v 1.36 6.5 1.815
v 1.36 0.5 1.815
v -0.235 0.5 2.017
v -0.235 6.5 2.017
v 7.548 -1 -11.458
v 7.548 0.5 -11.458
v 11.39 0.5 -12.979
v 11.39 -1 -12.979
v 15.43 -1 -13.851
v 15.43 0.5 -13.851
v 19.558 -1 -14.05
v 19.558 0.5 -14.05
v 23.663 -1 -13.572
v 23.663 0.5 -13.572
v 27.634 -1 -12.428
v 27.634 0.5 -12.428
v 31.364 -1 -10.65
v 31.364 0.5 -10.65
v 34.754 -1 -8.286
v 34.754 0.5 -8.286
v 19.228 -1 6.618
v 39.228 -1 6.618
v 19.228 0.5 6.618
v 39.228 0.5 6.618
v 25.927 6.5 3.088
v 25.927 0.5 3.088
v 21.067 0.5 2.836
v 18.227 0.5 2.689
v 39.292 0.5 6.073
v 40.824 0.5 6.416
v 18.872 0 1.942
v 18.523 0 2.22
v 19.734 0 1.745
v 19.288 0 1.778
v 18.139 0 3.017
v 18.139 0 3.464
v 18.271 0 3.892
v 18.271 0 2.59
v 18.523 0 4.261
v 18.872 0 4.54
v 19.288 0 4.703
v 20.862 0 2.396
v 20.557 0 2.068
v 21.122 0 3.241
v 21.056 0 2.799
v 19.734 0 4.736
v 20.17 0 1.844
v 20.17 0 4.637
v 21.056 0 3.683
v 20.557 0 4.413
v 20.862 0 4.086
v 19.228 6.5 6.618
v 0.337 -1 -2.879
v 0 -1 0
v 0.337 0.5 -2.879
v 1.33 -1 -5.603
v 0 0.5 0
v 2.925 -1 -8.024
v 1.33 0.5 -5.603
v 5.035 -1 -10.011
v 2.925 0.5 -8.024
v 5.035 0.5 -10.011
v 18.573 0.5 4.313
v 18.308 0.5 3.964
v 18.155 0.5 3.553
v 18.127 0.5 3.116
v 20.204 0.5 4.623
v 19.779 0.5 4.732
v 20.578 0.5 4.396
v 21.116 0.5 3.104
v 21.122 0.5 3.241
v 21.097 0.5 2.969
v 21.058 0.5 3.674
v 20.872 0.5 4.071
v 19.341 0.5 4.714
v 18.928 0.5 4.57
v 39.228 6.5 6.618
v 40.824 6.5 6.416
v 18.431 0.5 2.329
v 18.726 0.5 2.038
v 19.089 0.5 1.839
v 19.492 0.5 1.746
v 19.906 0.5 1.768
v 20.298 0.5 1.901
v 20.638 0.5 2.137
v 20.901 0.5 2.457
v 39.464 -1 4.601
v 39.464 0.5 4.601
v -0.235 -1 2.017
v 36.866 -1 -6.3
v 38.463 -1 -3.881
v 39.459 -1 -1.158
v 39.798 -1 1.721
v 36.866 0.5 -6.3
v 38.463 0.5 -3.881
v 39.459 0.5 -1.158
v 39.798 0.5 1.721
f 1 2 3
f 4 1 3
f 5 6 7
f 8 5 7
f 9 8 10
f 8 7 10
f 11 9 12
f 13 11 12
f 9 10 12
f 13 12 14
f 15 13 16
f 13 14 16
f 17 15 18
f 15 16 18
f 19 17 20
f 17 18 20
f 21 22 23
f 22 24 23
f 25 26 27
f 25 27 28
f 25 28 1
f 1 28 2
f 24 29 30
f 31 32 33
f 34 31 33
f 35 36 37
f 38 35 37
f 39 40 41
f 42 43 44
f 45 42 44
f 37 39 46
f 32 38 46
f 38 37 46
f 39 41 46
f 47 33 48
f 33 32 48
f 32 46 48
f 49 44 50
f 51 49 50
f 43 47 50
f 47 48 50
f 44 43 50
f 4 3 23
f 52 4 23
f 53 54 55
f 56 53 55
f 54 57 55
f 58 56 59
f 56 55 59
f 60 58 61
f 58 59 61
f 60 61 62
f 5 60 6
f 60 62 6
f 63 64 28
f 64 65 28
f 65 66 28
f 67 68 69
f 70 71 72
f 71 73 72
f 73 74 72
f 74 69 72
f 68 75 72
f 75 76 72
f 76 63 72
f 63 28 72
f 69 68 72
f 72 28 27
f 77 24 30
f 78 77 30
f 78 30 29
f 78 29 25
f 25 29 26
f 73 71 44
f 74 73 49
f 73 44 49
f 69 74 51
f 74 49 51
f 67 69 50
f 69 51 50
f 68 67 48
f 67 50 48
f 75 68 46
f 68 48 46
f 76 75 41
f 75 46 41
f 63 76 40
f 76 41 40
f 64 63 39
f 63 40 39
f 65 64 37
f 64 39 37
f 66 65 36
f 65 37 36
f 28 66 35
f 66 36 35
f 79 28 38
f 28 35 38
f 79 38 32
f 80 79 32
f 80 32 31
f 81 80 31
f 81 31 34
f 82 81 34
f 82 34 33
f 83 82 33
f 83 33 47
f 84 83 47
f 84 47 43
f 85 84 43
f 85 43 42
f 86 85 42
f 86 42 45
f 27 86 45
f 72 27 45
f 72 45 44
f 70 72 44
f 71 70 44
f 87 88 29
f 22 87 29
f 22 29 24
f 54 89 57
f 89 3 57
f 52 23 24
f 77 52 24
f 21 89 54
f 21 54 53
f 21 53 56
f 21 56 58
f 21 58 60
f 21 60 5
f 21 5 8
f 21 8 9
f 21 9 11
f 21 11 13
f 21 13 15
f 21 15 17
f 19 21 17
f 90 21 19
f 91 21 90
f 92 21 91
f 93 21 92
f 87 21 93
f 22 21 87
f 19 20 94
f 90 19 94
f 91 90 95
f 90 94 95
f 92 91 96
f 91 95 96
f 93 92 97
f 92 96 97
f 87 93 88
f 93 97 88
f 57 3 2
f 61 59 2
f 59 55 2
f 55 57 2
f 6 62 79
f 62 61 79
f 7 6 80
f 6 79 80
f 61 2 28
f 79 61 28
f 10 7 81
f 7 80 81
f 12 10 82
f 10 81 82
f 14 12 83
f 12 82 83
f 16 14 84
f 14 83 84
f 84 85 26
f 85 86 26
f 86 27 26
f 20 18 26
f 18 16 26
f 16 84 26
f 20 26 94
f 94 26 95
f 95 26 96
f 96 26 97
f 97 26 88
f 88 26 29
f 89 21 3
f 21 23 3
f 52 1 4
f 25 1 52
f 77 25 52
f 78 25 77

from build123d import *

# Parameters (mm, degrees)
SALIENTE_EXTRUIR2_DEPTH = 0.5
CORTAR_EXTRUIR1_DEPTH   = 0.5
CROQUIS10_R             = 1.5
SALIENTE_EXTRUIR5_DEPTH = 0.5
SALIENTE_EXTRUIR6_DEPTH = 6
SALIENTE_EXTRUIR8_DEPTH = 1


with BuildPart() as part:
    # Croquis2 → Saliente-Extruir2 (new body)
    with BuildSketch(Plane(origin=(0, 0, 0), x_dir=(1, 0, 0), z_dir=(0, 1, 0))):
        with BuildLine():
            Line((0, 0), (20, 0))
            Line((20, 0), (39.463577456, -4.600994744))
            ThreePointArc((39.463577456, -4.600994744), (39.040324802, 2.548287638), (34.753818463, 8.285642846))
            ThreePointArc((34.753818463, 8.285642846), (21.620038065, 13.895364206), (7.548005539, 11.457524625))
            ThreePointArc((7.548005539, 11.457524625), (2.056591074, 6.860161407), (0, 0))
        make_face()
    extrude(amount=SALIENTE_EXTRUIR2_DEPTH)

    # Croquis3 → Cortar-Extruir1 (cut)
    with BuildSketch(Plane(origin=(0, 0.5, 0), x_dir=(1, 0, 0), z_dir=(0, 1, 0))):
        with BuildLine():
            Line((20, 0), (16.5, 0))
            ThreePointArc((16.5, 0), (20.143291885, 1.229040833), (23.406126055, -0.80517408))
            Line((23.406126055, -0.80517408), (20, 0))
        make_face()
    extrude(amount=-CORTAR_EXTRUIR1_DEPTH, mode=Mode.SUBTRACT)

    # Croquis10 → Saliente-Extruir5 (add)
    with BuildSketch(Plane.XZ):
        Polygon((19.228440578, 6.617808668), (-0.235136993, 2.016814414), (0, 0), (19.62217394, -4.124844283), (39.463577456, 4.600994744), (39.228440578, 6.617808164), align=None)
        with Locations((19.622174052, 3.240683566)):
            Circle(CROQUIS10_R, mode=Mode.SUBTRACT)
    extrude(amount=-SALIENTE_EXTRUIR5_DEPTH)

    # Croquis11 → Saliente-Extruir6 (add)
    with BuildSketch(Plane(origin=(0, 0.5, 0), x_dir=(1, 0, 0), z_dir=(0, 1, 0))):
        Polygon((25.926575996, -3.088366571), (1.36009864, -1.814608984), (-0.235136987, -2.016814452), (19.228440593, -6.617808669), (39.228440593, -6.617808128), (40.823677784, -6.415602462), align=None)
    extrude(amount=SALIENTE_EXTRUIR6_DEPTH)

    # Croquis14 → Saliente-Extruir8 (add)
    with BuildSketch(Plane.XZ):
        with BuildLine():
            Line((39.463577456, 4.600994744), (39.228440578, 6.617808164))
            Line((39.228440578, 6.617808164), (19.228440578, 6.617808668))
            Line((19.228440578, 6.617808668), (-0.235136993, 2.016814414))
            Line((-0.235136993, 2.016814414), (0, 0))
            ThreePointArc((0, 0), (2.056591074, -6.860161407), (7.548005539, -11.457524625))
            ThreePointArc((7.548005539, -11.457524625), (21.620038065, -13.895364206), (34.753818463, -8.285642846))
            ThreePointArc((34.753818463, -8.285642846), (39.040324802, -2.548287638), (39.463577456, 4.600994744))
        make_face()
    extrude(amount=SALIENTE_EXTRUIR8_DEPTH)


solid = part.part
